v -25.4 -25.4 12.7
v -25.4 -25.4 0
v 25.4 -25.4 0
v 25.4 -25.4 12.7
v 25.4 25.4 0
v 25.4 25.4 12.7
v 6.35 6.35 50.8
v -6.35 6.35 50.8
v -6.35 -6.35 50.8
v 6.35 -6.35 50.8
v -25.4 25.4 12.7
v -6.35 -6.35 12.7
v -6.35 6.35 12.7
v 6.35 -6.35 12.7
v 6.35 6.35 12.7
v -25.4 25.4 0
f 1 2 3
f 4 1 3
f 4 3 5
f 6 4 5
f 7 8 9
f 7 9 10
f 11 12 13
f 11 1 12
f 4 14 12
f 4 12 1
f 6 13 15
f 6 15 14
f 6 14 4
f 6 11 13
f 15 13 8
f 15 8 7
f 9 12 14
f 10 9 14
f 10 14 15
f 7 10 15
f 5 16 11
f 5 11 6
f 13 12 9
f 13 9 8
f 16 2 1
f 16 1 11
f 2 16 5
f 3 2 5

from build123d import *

# Parameters (mm, degrees)
F0_W     = 50.8
F0_H     = 50.8
F1_DEPTH = 12.7
F2_W     = 12.7
F2_H     = 12.7
F3_DEPTH = 50.8


with BuildPart() as f1:
    # F0 (on Top) → F1 (new body)
    with BuildSketch(Plane.XY):
        Rectangle(F0_W, F0_H)
    extrude(amount=F1_DEPTH)

    # F2 (on Top) → F3 (join)
    with BuildSketch(Plane.XY):
        Rectangle(F2_W, F2_H)
    extrude(amount=F3_DEPTH)


solid = f1.part
